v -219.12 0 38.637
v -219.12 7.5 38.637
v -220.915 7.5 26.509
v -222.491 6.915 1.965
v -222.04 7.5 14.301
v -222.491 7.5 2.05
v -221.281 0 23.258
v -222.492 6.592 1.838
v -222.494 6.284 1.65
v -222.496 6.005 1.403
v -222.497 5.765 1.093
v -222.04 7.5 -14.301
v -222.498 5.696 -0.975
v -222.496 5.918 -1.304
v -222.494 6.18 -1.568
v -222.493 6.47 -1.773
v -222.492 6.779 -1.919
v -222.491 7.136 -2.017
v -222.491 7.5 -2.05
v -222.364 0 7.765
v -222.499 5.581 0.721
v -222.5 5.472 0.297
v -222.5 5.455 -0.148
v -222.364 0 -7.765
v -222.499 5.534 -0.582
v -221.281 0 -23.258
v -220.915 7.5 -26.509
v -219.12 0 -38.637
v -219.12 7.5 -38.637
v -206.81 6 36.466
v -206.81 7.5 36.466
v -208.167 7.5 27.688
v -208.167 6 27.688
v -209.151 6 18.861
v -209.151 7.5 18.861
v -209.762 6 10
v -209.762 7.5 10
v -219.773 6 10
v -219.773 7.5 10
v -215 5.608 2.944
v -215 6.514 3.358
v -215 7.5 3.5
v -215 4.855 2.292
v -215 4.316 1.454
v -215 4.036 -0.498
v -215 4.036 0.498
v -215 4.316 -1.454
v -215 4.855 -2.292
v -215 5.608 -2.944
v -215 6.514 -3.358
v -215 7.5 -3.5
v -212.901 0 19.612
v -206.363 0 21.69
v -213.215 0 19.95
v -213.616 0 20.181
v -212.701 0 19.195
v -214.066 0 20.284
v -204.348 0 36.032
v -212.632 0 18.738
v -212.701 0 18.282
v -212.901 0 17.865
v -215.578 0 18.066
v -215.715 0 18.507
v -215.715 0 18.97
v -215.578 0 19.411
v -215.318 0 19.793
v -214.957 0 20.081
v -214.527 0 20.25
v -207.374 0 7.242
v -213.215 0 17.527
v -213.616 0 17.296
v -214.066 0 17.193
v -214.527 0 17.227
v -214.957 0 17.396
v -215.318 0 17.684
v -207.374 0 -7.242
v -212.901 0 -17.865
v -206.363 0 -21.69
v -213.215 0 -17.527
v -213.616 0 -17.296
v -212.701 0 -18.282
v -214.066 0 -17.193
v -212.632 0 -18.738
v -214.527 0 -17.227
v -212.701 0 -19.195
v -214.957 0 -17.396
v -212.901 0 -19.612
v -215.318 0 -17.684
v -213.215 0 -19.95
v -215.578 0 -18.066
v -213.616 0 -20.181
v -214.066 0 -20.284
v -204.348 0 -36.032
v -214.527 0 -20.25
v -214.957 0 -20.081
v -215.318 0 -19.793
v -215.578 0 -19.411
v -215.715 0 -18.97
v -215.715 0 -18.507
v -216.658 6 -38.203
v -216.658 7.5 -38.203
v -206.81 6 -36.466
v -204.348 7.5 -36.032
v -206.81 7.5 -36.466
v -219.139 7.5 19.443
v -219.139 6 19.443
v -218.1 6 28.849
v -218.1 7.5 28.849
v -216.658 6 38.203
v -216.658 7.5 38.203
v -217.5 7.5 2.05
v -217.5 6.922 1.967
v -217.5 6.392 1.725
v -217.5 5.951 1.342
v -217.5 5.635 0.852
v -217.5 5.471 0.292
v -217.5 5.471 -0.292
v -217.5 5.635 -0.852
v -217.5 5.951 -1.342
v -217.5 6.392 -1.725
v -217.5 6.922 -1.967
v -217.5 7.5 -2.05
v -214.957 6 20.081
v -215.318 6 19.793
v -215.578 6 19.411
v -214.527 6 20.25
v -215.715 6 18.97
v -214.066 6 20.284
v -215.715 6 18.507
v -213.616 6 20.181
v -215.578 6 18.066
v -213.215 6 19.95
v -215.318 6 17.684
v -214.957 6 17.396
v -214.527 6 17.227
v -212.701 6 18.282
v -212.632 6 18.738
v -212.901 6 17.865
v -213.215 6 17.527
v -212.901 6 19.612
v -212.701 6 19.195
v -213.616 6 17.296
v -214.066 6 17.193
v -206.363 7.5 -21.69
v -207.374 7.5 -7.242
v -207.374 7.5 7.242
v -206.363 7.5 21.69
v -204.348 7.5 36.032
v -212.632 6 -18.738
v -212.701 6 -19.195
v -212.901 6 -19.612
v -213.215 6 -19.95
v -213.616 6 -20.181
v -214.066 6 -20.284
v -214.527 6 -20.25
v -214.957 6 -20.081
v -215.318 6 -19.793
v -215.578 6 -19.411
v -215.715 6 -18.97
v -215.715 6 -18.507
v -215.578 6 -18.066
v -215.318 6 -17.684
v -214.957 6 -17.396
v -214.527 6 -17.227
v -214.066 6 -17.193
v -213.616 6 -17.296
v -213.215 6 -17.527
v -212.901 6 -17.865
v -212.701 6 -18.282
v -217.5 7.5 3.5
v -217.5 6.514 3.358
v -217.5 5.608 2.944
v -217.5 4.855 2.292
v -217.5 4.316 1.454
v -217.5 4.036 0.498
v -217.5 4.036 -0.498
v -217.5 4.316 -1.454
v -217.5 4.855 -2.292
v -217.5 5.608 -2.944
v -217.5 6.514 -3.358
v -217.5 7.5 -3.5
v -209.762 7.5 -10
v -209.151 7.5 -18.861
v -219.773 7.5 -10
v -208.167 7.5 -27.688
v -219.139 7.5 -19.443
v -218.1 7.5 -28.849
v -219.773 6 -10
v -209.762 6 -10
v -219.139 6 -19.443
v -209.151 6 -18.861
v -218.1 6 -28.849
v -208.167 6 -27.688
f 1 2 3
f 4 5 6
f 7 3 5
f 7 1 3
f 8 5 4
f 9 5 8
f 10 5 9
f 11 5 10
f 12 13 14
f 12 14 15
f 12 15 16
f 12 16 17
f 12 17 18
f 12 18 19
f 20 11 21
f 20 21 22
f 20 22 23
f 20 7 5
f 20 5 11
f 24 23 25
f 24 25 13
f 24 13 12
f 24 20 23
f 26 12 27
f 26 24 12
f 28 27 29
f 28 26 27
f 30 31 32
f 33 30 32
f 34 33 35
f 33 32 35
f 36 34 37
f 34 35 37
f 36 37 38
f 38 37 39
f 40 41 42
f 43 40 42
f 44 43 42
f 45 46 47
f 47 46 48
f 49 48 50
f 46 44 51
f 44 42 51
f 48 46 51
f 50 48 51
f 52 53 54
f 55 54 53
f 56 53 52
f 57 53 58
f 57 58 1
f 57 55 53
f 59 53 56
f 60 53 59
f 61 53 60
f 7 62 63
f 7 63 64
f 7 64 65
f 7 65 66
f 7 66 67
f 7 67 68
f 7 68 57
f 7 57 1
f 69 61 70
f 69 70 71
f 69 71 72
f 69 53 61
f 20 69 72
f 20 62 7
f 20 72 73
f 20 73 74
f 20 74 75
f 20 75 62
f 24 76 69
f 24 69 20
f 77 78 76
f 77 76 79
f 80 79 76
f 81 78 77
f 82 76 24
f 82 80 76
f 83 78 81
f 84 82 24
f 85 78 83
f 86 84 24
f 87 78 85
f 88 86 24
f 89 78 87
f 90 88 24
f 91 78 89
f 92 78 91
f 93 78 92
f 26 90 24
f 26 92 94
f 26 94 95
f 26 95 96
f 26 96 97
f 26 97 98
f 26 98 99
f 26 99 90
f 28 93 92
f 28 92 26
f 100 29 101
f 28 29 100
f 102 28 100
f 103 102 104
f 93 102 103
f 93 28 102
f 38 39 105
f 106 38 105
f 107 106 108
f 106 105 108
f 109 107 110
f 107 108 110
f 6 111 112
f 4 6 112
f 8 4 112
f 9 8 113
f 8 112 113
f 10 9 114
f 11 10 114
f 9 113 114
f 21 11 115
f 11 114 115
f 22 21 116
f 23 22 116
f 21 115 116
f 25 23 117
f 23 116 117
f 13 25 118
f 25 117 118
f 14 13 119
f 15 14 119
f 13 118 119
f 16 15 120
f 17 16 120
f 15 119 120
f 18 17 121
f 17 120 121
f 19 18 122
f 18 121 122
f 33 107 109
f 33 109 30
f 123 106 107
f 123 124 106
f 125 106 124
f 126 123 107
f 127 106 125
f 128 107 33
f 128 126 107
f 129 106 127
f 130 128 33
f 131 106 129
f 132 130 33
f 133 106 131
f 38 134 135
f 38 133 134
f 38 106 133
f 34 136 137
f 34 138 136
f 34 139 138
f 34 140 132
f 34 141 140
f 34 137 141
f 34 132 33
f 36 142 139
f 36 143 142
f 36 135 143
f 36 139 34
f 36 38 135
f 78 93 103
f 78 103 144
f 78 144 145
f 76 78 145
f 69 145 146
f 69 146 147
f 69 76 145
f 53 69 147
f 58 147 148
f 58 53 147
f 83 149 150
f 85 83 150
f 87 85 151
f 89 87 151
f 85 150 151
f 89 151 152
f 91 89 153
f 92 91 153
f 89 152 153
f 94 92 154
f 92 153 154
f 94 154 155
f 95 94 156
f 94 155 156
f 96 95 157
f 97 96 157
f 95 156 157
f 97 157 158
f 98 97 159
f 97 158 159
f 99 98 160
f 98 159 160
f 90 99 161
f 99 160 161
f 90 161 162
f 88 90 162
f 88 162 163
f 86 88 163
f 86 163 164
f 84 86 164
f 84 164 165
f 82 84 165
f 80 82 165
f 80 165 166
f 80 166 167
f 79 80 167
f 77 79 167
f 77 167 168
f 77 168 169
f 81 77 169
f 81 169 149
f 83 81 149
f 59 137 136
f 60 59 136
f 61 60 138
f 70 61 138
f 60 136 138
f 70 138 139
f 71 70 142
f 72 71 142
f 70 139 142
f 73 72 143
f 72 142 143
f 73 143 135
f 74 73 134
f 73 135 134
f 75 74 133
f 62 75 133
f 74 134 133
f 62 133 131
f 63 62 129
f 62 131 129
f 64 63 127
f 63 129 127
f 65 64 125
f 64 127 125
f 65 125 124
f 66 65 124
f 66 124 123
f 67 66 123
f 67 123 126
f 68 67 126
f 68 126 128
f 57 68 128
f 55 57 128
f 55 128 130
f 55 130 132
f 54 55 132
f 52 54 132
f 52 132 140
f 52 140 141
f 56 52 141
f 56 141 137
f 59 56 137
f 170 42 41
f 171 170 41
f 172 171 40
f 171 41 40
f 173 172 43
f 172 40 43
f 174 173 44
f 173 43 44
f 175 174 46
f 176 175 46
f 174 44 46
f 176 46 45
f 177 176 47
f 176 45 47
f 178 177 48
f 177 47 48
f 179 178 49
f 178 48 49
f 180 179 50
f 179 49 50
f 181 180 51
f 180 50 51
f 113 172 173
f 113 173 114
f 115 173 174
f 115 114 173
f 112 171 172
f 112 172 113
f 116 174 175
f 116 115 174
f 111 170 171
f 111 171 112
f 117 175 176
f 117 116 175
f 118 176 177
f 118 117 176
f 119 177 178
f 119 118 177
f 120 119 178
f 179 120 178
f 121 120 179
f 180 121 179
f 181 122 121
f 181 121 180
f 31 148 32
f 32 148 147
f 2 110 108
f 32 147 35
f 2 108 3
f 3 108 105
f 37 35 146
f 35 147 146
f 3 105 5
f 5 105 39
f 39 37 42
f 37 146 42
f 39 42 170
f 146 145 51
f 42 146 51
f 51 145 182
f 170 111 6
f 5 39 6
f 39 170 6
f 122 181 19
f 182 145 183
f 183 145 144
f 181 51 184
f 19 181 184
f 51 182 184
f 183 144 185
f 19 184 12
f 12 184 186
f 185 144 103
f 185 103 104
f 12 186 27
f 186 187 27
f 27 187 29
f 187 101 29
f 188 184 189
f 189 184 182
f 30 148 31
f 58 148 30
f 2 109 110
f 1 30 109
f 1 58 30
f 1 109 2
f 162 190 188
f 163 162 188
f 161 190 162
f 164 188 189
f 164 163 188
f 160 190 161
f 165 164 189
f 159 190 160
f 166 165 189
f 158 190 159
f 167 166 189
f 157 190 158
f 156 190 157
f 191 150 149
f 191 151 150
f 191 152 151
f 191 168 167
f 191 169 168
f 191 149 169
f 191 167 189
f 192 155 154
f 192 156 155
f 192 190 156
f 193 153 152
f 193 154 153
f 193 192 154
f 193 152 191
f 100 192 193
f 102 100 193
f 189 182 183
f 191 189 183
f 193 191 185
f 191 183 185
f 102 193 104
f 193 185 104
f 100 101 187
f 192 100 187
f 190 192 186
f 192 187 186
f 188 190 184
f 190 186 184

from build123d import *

# Parameters (mm, degrees)
BOSS_EXTRUDE1_DEPTH        = 7.5
CUT_EXTRUDE1_DEPTH         = 1.5
SKETCH4_R                  = 3.5
CUT_EXTRUDE3_DEPTH         = 2.5
SKETCH5_R                  = 2.05
CUT_EXTRUDE4_DEPTH         = 41.774005634
F_3_1_3_1_DIAMETER_HOLE1_D = 3.1


with BuildPart() as part:
    # Sketch1 → Boss-Extrude1 (new body)
    with BuildSketch(Plane(origin=(0, 0, 0), x_dir=(1, 0, 0), z_dir=(0, 1, 0))):
        with BuildLine():
            Line((-219.119725045, 38.636719531), (-204.34760875, 36.031996866))
            ThreePointArc((-204.34760875, 36.031996866), (-207.5, 0), (-204.34760875, -36.031996866))
            Line((-204.34760875, -36.031996866), (-219.119725045, -38.636719531))
            ThreePointArc((-219.119725045, -38.636719531), (-222.5, 0), (-219.119725045, 38.636719531))
        make_face()
    extrude(amount=BOSS_EXTRUDE1_DEPTH)

    # Sketch2 → Cut-Extrude1 (cut)
    with BuildSketch(Plane(origin=(0, 7.5, 0), x_dir=(1, 0, 0), z_dir=(0, 1, 0))):
        with BuildLine():
            Line((-206.809628133, 36.46611731), (-216.657705663, 38.202599087))
            ThreePointArc((-216.657705663, 38.202599087), (-218.670303662, 24.151569236), (-219.772609758, 10))
            Line((-219.772609758, 10), (-209.761769634, 10))
            ThreePointArc((-209.761769634, 10), (-208.70564487, 23.279901188), (-206.809628133, 36.46611731))
        make_face()
        with BuildLine():
            Line((-209.761769634, -10), (-219.772609758, -10))
            ThreePointArc((-219.772609758, -10), (-218.670303662, -24.151569236), (-216.657705663, -38.202599087))
            Line((-216.657705663, -38.202599087), (-206.809628133, -36.46611731))
            ThreePointArc((-206.809628133, -36.46611731), (-208.70564487, -23.279901188), (-209.761769634, -10))
        make_face()
    extrude(amount=-CUT_EXTRUDE1_DEPTH, mode=Mode.SUBTRACT)

    # Sketch4 → Cut-Extrude3 (cut)
    with BuildSketch(Plane(origin=(-215, 0, 0), x_dir=(0, 0, -1), z_dir=(1, 0, 0))):
        with Locations((0, 7.5)):
            Circle(SKETCH4_R)
    extrude(amount=-CUT_EXTRUDE3_DEPTH, mode=Mode.SUBTRACT)

    # Sketch5 → Cut-Extrude4 (cut, through all)
    with BuildSketch(Plane(origin=(-215, 0, 0), x_dir=(0, 0, -1), z_dir=(1, 0, 0))):
        with Locations((0, 7.5)):
            Circle(SKETCH5_R)
    extrude(amount=-CUT_EXTRUDE4_DEPTH, mode=Mode.SUBTRACT)

    # Ø3.1 (3.1) Diameter Hole1 (through all)
    with Locations(Plane(origin=(0, 0, 0), x_dir=(-1, 0, 0), z_dir=(0, -1, 0))):
        with Locations((214.18186009, -18.738484691), (214.18186009, 18.738484691)):
            Hole(F_3_1_3_1_DIAMETER_HOLE1_D / 2)


solid = part.part
